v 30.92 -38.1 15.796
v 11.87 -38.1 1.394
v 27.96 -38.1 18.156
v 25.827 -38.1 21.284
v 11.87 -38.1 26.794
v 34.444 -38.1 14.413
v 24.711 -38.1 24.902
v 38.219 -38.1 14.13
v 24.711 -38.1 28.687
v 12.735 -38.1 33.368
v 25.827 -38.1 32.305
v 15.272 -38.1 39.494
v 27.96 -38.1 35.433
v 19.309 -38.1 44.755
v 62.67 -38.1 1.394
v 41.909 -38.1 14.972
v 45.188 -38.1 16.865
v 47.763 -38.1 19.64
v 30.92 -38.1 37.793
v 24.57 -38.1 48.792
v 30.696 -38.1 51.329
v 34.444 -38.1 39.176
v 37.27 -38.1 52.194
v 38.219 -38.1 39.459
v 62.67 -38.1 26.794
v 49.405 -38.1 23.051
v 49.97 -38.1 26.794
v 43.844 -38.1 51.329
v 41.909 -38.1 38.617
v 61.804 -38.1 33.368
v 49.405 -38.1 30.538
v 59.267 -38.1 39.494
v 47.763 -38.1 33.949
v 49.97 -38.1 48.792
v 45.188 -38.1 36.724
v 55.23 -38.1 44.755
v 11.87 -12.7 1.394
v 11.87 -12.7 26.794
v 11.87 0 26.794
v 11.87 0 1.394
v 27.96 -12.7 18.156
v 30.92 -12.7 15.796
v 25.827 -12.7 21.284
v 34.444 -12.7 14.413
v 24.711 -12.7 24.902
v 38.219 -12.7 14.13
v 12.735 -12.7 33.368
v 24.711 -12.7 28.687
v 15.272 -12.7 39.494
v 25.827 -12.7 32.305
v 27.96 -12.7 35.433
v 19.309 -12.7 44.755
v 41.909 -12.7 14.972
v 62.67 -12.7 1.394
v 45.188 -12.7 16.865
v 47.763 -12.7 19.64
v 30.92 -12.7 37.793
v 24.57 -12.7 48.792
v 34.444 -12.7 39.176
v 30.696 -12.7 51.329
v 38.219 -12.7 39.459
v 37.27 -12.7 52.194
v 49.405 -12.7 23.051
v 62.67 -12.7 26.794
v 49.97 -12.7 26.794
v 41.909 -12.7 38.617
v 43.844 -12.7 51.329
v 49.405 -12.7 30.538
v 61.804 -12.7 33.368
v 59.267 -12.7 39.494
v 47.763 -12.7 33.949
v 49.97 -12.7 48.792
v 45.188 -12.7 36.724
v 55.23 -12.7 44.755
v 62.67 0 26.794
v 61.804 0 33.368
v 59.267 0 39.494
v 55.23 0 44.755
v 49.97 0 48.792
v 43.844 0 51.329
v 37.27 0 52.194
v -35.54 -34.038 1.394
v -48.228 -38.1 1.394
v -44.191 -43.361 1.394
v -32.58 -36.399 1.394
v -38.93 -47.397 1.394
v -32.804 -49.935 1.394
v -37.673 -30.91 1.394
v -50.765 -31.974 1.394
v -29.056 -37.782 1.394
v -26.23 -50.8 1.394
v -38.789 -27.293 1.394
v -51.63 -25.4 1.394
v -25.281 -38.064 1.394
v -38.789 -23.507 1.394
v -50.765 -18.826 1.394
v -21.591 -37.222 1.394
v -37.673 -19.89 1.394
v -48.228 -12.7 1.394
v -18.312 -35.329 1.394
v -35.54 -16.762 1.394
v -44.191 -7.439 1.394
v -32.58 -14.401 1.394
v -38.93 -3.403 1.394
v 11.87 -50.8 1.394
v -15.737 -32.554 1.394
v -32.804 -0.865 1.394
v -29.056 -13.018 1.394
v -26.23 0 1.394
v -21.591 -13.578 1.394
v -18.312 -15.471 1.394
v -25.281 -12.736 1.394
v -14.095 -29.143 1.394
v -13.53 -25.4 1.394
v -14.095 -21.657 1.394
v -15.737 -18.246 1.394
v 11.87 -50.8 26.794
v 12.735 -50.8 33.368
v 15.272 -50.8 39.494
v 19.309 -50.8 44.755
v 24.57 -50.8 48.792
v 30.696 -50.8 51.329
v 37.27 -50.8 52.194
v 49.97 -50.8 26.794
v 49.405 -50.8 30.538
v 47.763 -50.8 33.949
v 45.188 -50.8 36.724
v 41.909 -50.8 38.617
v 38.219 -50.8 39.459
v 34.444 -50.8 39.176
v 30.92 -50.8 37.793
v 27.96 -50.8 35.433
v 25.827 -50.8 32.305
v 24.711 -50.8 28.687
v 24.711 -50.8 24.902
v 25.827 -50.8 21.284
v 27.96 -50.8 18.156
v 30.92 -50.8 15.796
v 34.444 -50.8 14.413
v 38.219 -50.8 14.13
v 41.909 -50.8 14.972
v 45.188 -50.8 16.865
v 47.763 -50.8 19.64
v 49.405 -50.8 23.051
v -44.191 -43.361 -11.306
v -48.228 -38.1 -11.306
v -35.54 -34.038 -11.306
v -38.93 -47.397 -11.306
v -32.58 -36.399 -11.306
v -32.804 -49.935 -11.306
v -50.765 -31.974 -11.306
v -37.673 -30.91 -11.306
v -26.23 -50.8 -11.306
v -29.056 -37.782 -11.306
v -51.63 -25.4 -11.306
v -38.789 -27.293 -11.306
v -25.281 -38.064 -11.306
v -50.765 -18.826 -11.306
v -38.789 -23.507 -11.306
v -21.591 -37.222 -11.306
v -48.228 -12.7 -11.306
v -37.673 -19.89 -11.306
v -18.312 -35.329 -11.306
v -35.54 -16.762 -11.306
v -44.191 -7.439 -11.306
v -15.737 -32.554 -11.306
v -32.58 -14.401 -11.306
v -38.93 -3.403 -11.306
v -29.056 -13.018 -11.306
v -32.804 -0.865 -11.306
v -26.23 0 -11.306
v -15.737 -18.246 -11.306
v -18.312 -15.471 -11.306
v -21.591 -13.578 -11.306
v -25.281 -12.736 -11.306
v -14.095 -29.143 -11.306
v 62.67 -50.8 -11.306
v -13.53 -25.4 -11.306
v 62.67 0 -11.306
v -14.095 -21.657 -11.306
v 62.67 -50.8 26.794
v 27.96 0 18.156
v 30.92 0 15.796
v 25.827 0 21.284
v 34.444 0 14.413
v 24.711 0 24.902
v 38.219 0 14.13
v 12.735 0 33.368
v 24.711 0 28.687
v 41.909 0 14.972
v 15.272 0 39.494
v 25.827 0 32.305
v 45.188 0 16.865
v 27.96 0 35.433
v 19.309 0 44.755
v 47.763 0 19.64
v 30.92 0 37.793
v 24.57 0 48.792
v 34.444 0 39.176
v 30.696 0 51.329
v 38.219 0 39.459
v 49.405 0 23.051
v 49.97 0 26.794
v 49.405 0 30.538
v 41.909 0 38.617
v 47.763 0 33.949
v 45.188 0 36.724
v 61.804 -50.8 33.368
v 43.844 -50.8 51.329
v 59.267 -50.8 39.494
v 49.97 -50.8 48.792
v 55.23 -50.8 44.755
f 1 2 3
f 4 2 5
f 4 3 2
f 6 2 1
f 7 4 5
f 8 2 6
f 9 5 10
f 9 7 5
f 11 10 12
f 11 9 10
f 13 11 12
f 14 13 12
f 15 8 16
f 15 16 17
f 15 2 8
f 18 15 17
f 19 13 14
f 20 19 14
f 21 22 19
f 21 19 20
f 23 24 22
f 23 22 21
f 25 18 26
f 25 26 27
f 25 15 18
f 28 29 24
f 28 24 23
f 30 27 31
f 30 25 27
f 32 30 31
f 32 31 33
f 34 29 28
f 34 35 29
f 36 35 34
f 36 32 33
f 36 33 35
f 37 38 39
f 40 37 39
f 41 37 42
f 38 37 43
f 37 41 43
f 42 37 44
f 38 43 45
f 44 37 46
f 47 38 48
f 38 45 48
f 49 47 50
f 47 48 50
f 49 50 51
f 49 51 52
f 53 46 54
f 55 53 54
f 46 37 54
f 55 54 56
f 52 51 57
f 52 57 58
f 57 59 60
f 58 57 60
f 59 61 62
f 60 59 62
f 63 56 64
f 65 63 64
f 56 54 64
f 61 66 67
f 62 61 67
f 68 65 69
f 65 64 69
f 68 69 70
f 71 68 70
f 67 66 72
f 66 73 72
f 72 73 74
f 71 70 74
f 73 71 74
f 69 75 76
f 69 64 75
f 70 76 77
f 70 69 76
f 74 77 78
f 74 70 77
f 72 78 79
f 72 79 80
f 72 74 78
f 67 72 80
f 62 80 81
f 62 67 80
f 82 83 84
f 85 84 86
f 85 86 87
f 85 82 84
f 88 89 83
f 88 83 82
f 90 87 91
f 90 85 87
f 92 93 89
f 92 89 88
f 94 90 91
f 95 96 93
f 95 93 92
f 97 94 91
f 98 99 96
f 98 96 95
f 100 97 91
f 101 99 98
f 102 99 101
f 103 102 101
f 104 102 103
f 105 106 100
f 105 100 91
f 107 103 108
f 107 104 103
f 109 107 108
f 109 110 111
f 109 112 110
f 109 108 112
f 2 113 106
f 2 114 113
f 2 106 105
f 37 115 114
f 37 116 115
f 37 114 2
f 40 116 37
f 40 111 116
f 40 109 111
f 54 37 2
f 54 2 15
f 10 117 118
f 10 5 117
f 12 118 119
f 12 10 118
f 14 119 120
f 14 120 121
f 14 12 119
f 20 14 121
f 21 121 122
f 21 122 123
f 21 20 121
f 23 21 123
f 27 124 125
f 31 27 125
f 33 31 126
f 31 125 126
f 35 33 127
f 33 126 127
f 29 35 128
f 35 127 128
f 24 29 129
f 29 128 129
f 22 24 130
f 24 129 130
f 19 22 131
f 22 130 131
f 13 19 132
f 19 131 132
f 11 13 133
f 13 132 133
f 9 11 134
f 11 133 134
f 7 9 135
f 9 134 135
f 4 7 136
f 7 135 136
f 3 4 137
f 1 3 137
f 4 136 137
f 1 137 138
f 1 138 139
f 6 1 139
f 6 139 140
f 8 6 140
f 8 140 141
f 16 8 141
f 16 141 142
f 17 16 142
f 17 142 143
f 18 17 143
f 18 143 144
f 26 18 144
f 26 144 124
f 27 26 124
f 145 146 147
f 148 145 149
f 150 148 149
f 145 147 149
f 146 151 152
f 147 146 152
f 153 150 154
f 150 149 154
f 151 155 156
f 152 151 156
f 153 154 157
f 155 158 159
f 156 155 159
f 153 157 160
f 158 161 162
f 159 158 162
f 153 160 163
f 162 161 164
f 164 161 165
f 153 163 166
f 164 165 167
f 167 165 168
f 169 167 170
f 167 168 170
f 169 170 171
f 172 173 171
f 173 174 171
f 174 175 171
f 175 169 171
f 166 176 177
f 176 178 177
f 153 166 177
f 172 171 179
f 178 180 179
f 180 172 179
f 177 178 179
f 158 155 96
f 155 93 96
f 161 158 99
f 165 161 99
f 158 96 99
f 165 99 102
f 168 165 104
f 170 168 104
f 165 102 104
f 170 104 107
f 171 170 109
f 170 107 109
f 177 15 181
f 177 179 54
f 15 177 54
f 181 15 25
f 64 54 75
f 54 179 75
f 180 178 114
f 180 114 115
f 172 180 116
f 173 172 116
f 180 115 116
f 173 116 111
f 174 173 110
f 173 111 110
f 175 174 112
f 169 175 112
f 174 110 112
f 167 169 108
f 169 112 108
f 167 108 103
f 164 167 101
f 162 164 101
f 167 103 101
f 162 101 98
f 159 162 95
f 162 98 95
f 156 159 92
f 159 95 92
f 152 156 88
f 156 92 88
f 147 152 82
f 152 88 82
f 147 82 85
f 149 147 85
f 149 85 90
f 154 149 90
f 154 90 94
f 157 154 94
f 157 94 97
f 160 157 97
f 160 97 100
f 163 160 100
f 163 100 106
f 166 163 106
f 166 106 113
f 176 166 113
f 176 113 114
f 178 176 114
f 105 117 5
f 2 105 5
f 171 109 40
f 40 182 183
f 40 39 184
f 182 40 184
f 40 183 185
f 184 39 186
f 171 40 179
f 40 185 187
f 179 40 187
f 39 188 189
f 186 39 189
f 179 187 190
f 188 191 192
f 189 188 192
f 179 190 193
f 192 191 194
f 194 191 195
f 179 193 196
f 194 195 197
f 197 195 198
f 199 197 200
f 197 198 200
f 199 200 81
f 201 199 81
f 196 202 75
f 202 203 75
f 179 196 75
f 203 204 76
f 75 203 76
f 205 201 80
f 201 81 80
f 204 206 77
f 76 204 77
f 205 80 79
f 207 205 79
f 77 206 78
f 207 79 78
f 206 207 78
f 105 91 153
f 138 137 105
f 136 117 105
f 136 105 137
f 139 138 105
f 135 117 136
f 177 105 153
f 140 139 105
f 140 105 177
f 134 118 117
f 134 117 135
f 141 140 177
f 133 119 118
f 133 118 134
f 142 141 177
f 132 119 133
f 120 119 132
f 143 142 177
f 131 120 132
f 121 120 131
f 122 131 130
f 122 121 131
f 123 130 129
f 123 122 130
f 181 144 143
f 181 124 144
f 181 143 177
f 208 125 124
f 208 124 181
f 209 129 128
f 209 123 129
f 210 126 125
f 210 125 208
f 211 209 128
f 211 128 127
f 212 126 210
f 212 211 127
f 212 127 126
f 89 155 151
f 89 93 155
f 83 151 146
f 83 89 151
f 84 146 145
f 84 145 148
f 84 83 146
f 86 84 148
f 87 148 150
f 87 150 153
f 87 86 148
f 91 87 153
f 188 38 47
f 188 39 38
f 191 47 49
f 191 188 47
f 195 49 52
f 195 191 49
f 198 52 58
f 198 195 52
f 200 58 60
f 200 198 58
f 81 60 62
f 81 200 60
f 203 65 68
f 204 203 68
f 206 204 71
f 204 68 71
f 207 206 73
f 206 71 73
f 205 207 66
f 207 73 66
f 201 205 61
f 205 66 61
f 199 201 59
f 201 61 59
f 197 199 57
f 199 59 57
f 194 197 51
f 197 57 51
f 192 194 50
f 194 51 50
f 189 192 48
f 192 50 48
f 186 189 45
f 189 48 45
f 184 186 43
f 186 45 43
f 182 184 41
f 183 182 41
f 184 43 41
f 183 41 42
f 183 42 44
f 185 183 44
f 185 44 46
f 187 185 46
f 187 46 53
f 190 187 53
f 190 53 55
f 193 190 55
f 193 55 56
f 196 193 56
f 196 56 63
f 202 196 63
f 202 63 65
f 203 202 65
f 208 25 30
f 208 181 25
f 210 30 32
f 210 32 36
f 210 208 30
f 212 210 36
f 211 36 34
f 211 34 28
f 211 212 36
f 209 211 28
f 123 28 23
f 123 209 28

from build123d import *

# Parameters (mm, degrees)
F0_W      = 114.3
F0_H      = 63.5
F1_DEPTH  = 50.8
F2_W      = 25.4
F2_H      = 57.0441053795
F3_DEPTH  = 114.301
F4_W      = 63.5
F4_H      = 12.7
F5_DEPTH  = 50.8
F6_W      = 63.5
F6_H      = 12.7
F7_DEPTH  = 50.8
F8_R      = 12.7
F9_DEPTH  = 50.801
F10_R     = 25.39999
F11_R     = 12.7
F12_DEPTH = 12.701


# Not quite as in the source:
# - a fillet or chamfer is up to 0.001 mm smaller than in the source, because OpenCascade refuses the exact size


with BuildPart() as f1:
    # F0 (on Front) → F1 (new body)
    with BuildSketch(Plane.XZ):
        with Locations((5.5195242167, 20.4444855223)):
            Rectangle(F0_W, F0_H)
    extrude(amount=F1_DEPTH)

    # F2 (on face) → F3 (cut, through all)
    with BuildSketch(Plane.YZ.offset(62.6695242167)):
        with Locations((-25.4, 29.9165382121)):
            Rectangle(F2_W, F2_H)
    extrude(amount=-F3_DEPTH, mode=Mode.SUBTRACT)

    # F4 (on face) → F5 (cut)
    with BuildSketch(Plane.XY.offset(52.1944855223)):
        with Locations((-19.8804757833, -44.45)):
            Rectangle(F4_W, F4_H)
    extrude(amount=-F5_DEPTH, mode=Mode.SUBTRACT)

    # F6 (on face) → F7 (cut)
    with BuildSketch(Plane.XY.offset(52.1944855223)):
        with Locations((-19.8804757833, -6.35)):
            Rectangle(F6_W, F6_H)
    extrude(amount=-F7_DEPTH, mode=Mode.SUBTRACT)

    # F8 (on face) → F9 (cut, through all)
    with BuildSketch(Plane.XZ.offset(50.8)):
        with Locations((37.2695242167, 26.7944855223)):
            Circle(F8_R)
    extrude(amount=-F9_DEPTH, mode=Mode.SUBTRACT)

    # F10 (radius 25.4 in the source; OpenCascade refuses exactly that, so slightly less here)
    f10_edges = [f1.edges().sort_by_distance(p)[0] for p in [
        (62.669524, -44.45, 52.194486),
        (11.869524, -44.45, 52.194486),
        (11.869524, -6.35, 52.194486),
        (62.669524, -6.35, 52.194486),
        (-51.630476, -50.8, -4.955514),
        (-51.630476, 0, -4.955514),
    ]]
    fillet(f10_edges, radius=F10_R)

    # F11 (on face) → F12 (cut, through all)
    with BuildSketch(Plane.XY.offset(1.3944855223)):
        with Locations((-26.2304757833, -25.4)):
            Circle(F11_R)
    extrude(amount=-F12_DEPTH, mode=Mode.SUBTRACT)


solid = f1.part
